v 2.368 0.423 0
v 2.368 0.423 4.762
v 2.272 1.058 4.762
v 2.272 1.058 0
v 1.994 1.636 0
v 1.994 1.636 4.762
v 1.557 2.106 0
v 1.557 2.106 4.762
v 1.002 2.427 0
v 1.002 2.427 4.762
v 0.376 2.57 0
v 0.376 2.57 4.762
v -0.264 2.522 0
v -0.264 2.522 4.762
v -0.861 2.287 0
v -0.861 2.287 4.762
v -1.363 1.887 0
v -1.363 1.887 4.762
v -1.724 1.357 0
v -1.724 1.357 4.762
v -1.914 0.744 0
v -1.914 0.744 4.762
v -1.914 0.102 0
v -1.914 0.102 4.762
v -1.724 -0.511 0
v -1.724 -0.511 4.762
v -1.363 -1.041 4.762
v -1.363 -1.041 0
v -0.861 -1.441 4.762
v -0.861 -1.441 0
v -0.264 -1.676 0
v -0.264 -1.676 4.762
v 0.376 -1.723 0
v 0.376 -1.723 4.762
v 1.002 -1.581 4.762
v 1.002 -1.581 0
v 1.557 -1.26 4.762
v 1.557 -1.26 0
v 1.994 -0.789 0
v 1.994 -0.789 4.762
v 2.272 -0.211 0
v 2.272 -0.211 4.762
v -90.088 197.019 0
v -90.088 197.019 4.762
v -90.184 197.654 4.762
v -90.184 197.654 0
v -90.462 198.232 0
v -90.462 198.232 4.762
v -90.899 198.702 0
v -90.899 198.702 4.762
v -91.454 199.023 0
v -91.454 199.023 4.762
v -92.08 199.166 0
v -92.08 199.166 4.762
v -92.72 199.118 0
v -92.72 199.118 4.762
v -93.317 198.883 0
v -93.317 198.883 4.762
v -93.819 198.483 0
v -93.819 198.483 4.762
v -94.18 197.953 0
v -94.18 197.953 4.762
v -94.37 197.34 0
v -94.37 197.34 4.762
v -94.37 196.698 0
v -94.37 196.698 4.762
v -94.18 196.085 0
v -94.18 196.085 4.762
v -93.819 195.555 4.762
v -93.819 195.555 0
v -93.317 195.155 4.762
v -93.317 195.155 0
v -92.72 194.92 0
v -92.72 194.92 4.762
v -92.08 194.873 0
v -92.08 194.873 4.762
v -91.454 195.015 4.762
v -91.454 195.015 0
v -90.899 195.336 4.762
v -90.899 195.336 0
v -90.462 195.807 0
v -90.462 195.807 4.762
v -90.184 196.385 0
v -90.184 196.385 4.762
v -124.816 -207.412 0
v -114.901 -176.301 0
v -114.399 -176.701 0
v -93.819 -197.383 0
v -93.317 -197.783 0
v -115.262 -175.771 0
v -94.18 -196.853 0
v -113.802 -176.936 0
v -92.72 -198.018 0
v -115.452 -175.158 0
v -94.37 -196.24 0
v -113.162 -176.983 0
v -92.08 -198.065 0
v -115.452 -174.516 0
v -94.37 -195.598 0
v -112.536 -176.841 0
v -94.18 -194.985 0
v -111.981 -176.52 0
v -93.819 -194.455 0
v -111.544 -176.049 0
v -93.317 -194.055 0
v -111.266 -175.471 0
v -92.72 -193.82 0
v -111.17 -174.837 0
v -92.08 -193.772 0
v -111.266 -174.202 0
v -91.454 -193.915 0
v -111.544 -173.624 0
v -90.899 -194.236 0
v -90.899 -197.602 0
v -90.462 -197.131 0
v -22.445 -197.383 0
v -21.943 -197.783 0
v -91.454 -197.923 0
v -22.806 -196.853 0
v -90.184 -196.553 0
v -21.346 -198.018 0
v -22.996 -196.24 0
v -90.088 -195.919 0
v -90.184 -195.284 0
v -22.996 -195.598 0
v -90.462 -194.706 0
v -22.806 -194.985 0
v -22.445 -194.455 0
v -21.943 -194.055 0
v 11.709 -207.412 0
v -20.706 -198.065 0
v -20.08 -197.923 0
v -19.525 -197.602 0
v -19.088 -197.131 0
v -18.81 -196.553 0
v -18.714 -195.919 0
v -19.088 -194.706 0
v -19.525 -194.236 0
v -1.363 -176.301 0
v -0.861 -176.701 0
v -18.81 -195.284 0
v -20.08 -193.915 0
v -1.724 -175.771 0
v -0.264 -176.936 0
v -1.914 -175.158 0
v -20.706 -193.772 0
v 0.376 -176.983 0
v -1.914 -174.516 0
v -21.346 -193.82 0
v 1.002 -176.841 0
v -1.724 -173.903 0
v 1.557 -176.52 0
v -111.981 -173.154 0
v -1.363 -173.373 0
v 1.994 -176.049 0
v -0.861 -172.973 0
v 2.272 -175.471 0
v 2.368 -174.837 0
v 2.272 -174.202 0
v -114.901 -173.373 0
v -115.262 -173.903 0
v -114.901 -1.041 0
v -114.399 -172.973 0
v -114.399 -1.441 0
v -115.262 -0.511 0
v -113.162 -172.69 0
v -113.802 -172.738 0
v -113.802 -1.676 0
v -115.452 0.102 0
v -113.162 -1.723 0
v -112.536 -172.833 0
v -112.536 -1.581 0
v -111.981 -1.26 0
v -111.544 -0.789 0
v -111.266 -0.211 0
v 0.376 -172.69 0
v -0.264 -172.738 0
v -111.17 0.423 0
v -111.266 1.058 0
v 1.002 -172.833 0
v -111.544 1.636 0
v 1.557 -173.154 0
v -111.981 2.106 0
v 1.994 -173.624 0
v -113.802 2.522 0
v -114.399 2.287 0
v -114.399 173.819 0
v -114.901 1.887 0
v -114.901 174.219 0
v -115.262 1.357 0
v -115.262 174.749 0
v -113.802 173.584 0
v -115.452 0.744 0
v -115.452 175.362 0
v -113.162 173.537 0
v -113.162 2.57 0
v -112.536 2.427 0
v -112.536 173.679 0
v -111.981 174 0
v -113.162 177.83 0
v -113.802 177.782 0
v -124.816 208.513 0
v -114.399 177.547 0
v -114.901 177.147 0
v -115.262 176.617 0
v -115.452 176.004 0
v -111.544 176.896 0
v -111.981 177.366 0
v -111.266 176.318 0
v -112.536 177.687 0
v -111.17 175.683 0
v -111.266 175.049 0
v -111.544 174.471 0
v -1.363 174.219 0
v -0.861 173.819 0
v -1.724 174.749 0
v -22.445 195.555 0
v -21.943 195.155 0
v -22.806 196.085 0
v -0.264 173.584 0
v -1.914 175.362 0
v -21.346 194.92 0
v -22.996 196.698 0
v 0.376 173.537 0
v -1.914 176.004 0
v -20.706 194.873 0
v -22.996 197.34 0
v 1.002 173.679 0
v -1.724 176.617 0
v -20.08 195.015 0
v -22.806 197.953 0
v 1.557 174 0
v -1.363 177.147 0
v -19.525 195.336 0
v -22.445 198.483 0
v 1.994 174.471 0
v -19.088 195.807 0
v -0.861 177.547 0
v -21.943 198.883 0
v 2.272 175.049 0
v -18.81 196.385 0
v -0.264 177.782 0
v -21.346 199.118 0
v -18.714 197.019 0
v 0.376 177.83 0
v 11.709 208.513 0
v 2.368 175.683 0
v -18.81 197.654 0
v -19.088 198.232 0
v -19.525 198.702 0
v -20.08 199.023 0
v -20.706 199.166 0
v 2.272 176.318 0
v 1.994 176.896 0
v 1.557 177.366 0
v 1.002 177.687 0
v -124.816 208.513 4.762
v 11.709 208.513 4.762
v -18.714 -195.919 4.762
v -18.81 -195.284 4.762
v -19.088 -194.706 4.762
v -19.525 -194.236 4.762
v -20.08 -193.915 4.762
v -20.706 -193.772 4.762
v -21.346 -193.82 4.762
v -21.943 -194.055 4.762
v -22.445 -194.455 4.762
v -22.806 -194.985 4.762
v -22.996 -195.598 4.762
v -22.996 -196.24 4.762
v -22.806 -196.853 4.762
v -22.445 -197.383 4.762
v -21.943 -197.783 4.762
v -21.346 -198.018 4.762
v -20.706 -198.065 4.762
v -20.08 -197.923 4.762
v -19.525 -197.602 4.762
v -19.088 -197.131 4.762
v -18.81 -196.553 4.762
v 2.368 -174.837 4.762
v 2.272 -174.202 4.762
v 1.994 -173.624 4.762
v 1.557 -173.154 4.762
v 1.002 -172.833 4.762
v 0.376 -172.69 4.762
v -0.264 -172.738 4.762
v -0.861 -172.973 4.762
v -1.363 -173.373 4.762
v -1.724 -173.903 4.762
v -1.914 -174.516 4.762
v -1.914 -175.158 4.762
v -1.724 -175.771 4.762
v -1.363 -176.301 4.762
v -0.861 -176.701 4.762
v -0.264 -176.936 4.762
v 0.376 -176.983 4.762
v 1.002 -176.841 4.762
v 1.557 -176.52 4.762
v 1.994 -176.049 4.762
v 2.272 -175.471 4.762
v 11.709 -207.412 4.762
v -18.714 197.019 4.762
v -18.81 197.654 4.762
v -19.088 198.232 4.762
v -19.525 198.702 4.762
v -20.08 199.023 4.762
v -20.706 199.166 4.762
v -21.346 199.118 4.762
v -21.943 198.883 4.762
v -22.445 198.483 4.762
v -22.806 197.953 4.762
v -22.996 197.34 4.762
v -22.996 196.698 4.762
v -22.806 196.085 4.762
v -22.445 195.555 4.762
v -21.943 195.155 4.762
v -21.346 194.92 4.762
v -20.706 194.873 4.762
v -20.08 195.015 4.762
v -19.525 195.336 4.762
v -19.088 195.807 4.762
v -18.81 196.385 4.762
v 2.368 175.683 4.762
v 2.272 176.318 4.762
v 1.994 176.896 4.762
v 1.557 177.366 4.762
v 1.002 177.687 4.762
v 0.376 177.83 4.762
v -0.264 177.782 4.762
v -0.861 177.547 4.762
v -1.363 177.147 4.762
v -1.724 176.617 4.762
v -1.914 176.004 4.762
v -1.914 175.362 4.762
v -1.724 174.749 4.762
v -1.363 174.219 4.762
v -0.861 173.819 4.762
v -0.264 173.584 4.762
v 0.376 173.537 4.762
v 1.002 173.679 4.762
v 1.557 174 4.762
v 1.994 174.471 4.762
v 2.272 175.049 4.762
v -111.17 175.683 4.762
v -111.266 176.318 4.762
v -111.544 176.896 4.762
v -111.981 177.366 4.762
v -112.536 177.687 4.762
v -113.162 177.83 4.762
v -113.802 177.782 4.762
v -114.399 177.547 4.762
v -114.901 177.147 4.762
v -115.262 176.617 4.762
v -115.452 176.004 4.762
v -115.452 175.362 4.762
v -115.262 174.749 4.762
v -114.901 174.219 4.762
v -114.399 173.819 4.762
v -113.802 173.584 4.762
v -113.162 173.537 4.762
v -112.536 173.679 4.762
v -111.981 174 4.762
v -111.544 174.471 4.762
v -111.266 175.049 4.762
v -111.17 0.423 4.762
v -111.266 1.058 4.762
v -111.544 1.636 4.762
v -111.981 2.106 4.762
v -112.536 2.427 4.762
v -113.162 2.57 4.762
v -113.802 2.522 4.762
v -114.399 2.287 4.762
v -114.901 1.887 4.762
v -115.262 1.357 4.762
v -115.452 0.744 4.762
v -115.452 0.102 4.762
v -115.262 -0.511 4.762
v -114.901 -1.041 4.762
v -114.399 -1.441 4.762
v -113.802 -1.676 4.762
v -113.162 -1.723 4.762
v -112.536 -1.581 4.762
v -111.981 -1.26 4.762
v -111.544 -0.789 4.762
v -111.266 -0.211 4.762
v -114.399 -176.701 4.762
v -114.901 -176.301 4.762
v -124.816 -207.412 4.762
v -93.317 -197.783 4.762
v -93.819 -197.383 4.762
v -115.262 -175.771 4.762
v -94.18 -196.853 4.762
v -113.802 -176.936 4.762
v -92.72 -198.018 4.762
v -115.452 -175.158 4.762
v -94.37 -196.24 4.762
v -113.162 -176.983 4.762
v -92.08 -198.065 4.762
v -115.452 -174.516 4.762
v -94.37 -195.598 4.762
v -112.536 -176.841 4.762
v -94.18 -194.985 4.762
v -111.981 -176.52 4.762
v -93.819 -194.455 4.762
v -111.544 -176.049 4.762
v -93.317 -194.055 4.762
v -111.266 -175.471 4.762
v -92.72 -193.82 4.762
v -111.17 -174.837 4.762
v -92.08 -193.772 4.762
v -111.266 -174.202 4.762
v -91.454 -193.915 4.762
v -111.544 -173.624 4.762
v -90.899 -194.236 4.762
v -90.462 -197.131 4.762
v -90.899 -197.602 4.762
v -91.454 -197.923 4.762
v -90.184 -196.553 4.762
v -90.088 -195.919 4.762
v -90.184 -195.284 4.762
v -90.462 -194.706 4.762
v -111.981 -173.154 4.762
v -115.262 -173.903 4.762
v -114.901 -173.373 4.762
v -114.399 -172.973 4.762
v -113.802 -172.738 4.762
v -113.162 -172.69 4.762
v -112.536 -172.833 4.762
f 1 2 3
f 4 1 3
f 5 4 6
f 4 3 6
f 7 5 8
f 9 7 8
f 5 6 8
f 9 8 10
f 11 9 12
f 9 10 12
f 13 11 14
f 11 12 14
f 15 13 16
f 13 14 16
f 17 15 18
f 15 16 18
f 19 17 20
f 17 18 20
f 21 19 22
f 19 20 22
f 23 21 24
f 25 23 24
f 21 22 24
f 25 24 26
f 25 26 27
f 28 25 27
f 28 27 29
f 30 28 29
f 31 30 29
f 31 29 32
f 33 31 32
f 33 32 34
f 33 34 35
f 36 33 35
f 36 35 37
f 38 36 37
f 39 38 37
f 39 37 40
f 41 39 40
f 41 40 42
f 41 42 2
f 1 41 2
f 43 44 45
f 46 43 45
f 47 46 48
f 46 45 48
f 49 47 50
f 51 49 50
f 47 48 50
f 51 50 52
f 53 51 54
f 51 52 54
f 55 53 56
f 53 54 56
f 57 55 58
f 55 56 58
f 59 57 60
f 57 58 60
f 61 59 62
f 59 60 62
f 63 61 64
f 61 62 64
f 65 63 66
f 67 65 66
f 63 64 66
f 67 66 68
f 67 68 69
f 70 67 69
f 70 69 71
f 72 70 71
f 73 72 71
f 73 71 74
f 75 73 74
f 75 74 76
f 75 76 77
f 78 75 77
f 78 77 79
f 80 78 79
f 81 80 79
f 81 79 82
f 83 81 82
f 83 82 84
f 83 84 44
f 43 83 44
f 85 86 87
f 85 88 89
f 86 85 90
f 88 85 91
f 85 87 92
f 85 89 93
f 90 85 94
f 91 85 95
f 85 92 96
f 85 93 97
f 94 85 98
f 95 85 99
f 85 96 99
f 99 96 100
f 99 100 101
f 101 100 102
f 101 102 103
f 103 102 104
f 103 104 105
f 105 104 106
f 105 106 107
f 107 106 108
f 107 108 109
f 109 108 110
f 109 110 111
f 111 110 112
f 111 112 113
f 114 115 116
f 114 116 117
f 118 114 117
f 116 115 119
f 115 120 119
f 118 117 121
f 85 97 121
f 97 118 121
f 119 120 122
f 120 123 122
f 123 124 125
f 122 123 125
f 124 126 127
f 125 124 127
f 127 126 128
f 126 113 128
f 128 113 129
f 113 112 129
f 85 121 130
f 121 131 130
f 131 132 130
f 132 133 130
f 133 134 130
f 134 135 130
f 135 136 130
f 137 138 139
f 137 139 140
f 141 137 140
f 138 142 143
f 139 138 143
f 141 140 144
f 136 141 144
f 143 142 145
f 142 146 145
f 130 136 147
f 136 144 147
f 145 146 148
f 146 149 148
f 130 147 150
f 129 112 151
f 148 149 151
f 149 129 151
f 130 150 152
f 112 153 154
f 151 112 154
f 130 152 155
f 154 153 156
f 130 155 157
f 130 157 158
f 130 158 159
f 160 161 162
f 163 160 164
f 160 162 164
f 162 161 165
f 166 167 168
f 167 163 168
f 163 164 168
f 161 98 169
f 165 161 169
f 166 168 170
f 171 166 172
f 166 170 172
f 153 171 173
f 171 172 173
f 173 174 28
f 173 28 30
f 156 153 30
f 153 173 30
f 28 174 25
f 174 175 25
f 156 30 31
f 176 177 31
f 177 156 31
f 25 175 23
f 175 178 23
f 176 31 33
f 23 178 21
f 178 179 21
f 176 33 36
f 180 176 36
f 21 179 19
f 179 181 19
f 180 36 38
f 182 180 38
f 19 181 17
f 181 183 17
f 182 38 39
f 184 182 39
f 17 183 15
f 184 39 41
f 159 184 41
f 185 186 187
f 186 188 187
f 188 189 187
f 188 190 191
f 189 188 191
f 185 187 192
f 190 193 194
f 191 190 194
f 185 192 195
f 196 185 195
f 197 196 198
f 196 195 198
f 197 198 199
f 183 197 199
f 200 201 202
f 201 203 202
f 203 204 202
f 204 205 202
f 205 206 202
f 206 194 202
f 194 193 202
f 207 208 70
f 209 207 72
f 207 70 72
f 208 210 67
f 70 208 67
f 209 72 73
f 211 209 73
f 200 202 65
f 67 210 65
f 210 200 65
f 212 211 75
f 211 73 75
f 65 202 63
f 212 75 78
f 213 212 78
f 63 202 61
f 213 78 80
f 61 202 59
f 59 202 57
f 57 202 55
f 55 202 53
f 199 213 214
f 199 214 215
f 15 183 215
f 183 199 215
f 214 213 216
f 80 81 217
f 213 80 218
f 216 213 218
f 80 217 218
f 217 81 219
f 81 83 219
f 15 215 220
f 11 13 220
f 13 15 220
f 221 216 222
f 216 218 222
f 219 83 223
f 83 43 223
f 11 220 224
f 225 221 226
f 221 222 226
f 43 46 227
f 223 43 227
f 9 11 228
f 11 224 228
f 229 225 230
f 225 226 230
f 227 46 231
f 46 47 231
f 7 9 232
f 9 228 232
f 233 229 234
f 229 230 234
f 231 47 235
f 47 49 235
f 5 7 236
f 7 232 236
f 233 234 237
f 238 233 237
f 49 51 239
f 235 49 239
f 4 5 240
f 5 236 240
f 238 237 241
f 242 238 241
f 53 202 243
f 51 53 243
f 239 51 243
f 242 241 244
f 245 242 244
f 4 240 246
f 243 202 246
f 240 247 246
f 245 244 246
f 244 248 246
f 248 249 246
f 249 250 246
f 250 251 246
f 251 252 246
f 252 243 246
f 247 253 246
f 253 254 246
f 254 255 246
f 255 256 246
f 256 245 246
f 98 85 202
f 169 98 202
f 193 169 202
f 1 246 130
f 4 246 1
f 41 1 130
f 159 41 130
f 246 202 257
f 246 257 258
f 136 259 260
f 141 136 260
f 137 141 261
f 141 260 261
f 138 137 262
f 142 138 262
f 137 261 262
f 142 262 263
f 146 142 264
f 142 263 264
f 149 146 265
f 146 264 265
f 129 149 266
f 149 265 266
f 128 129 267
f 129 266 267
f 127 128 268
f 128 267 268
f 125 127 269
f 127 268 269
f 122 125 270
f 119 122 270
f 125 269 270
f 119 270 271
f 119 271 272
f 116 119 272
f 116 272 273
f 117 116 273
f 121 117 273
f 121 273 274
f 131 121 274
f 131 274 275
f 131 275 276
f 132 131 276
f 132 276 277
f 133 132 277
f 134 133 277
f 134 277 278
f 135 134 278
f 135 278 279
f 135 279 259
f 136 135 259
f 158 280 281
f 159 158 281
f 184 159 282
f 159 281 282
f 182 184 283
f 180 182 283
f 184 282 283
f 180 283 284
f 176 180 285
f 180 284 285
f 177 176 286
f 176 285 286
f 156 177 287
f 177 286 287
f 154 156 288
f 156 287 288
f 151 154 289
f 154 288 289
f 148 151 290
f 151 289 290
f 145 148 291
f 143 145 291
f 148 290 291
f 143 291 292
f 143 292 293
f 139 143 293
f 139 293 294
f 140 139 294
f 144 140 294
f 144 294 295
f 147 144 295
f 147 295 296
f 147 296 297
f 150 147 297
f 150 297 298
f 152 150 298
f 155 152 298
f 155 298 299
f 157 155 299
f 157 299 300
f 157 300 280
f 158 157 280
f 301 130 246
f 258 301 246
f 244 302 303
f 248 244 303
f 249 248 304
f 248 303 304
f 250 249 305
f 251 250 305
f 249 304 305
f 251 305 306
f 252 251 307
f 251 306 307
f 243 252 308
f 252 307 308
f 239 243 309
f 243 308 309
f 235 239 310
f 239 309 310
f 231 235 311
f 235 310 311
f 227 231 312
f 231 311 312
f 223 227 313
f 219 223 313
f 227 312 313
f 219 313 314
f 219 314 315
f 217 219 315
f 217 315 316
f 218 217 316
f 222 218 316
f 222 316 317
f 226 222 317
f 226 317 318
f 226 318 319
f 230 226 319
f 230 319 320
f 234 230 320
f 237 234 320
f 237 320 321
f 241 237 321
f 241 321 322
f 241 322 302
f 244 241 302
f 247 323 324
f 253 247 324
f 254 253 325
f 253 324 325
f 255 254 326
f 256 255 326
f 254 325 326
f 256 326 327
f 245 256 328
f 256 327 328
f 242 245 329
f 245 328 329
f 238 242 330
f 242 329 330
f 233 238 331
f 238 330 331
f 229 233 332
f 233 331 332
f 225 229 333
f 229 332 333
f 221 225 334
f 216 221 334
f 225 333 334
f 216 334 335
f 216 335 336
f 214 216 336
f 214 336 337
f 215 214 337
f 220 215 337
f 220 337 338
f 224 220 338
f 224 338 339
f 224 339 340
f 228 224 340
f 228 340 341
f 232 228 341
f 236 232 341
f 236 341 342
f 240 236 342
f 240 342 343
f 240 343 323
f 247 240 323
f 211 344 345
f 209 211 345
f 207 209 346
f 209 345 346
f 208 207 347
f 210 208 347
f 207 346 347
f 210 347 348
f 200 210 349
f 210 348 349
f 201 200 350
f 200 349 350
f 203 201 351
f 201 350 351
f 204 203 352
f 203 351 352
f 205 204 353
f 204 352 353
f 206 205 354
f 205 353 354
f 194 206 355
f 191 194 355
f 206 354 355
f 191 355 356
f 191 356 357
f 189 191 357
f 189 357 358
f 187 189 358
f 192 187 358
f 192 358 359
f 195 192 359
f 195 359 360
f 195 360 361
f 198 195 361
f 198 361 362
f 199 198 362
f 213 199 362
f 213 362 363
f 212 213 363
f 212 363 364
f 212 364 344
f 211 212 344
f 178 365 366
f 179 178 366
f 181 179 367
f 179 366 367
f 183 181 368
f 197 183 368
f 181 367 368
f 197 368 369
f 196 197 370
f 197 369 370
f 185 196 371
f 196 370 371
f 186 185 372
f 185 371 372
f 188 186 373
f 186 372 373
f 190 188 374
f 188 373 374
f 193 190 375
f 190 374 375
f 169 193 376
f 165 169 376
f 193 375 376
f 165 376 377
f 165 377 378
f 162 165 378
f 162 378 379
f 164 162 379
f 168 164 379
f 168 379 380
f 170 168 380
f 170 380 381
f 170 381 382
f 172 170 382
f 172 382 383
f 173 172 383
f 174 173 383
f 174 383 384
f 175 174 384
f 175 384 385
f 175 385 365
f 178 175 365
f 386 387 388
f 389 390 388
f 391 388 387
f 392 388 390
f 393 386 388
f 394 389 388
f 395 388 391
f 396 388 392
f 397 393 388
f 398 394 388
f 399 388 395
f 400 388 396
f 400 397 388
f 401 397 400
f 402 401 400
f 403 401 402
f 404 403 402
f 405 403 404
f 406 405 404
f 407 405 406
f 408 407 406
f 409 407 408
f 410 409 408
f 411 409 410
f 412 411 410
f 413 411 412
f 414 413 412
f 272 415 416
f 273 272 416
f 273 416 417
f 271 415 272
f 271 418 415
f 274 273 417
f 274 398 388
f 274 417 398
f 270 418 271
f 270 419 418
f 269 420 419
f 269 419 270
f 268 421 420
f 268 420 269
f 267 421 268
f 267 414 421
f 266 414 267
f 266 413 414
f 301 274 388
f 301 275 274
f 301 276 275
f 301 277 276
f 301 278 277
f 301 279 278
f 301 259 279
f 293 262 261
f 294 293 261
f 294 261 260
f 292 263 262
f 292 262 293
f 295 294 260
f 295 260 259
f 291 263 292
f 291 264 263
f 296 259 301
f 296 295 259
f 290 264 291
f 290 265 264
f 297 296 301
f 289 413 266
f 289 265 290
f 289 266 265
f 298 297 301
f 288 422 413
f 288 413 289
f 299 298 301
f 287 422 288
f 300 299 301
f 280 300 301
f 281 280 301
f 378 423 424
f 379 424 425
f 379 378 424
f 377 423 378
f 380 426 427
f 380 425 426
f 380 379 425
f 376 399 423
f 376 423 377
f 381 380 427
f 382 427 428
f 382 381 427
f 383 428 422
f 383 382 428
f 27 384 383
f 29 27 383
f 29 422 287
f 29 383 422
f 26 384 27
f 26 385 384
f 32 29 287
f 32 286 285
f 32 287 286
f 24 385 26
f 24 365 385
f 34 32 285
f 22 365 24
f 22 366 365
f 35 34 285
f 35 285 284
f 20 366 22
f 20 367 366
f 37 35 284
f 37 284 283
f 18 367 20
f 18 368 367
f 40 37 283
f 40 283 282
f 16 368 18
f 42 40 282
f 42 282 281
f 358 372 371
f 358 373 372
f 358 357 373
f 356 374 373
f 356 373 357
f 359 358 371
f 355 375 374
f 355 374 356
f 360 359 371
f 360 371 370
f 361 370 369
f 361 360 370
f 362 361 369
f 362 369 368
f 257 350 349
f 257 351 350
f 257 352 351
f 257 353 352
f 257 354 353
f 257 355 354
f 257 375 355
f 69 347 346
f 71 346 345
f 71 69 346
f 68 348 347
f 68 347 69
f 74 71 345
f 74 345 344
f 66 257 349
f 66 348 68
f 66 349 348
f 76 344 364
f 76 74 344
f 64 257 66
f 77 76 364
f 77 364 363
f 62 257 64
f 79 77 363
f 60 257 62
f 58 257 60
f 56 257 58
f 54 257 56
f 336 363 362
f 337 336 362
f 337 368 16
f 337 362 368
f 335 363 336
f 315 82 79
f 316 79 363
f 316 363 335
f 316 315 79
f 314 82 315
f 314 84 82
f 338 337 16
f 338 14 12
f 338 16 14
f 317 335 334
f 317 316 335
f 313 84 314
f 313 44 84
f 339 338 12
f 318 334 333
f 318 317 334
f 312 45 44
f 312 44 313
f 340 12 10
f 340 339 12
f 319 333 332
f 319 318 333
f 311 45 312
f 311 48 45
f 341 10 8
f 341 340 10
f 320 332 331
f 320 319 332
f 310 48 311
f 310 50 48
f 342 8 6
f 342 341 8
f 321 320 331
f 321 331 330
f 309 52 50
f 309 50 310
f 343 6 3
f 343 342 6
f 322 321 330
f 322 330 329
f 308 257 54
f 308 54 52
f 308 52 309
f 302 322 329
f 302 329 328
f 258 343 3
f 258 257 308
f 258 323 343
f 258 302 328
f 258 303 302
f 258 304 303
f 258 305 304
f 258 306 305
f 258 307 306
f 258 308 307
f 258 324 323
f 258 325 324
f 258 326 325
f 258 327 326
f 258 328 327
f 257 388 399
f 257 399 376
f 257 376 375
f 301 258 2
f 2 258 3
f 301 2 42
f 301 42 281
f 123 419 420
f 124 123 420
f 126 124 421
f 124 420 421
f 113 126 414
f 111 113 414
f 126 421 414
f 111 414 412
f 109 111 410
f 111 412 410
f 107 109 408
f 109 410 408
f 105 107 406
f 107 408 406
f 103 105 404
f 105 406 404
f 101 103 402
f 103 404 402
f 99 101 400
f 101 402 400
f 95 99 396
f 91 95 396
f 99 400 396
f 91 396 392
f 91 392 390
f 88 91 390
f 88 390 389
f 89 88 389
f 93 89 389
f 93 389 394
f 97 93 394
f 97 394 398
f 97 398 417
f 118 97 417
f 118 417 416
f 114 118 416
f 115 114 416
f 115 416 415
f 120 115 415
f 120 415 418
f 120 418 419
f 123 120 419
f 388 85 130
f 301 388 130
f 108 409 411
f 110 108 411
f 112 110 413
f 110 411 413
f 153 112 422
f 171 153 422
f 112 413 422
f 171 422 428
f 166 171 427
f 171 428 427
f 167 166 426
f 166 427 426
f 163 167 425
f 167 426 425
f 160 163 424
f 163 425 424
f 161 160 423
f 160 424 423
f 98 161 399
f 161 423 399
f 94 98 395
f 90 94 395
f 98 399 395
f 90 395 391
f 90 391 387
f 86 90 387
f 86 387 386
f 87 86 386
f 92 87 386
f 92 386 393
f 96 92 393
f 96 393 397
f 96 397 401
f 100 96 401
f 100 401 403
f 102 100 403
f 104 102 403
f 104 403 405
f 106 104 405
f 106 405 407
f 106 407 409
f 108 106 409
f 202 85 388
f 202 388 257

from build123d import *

# Parameters (mm, degrees)
SKETCH1_W             = 136.525
SKETCH1_H             = 415.925
BOSS_EXTRUDE1_DEPTH   = 4.7625
F_8_CLEARANCE_HOLE1_D = 4.3053


with BuildPart() as part:
    # Sketch1 → Boss-Extrude1 (new body)
    with BuildSketch(Plane.XY):
        with Locations((-56.553919361, 0.550165344)):
            Rectangle(SKETCH1_W, SKETCH1_H)
    extrude(amount=BOSS_EXTRUDE1_DEPTH)

    # #8 Clearance Hole1 (through all)
    with Locations(Plane(origin=(0, 0, 0), x_dir=(-1, 0, 0), z_dir=(0, 0, -1))):
        with Locations((92.240919361, -195.918834656), (113.322919361, -174.836834656), (20.866919361, -195.918834656), (-0.215080639, -174.836834656), (113.322919361, 0.423165344), (92.240919361, 197.019165344), (20.866919361, 197.019165344), (-0.215080639, 0.423165344), (113.322919361, 175.683165344), (-0.215080639, 175.683165344)):
            Hole(F_8_CLEARANCE_HOLE1_D / 2)


solid = part.part
